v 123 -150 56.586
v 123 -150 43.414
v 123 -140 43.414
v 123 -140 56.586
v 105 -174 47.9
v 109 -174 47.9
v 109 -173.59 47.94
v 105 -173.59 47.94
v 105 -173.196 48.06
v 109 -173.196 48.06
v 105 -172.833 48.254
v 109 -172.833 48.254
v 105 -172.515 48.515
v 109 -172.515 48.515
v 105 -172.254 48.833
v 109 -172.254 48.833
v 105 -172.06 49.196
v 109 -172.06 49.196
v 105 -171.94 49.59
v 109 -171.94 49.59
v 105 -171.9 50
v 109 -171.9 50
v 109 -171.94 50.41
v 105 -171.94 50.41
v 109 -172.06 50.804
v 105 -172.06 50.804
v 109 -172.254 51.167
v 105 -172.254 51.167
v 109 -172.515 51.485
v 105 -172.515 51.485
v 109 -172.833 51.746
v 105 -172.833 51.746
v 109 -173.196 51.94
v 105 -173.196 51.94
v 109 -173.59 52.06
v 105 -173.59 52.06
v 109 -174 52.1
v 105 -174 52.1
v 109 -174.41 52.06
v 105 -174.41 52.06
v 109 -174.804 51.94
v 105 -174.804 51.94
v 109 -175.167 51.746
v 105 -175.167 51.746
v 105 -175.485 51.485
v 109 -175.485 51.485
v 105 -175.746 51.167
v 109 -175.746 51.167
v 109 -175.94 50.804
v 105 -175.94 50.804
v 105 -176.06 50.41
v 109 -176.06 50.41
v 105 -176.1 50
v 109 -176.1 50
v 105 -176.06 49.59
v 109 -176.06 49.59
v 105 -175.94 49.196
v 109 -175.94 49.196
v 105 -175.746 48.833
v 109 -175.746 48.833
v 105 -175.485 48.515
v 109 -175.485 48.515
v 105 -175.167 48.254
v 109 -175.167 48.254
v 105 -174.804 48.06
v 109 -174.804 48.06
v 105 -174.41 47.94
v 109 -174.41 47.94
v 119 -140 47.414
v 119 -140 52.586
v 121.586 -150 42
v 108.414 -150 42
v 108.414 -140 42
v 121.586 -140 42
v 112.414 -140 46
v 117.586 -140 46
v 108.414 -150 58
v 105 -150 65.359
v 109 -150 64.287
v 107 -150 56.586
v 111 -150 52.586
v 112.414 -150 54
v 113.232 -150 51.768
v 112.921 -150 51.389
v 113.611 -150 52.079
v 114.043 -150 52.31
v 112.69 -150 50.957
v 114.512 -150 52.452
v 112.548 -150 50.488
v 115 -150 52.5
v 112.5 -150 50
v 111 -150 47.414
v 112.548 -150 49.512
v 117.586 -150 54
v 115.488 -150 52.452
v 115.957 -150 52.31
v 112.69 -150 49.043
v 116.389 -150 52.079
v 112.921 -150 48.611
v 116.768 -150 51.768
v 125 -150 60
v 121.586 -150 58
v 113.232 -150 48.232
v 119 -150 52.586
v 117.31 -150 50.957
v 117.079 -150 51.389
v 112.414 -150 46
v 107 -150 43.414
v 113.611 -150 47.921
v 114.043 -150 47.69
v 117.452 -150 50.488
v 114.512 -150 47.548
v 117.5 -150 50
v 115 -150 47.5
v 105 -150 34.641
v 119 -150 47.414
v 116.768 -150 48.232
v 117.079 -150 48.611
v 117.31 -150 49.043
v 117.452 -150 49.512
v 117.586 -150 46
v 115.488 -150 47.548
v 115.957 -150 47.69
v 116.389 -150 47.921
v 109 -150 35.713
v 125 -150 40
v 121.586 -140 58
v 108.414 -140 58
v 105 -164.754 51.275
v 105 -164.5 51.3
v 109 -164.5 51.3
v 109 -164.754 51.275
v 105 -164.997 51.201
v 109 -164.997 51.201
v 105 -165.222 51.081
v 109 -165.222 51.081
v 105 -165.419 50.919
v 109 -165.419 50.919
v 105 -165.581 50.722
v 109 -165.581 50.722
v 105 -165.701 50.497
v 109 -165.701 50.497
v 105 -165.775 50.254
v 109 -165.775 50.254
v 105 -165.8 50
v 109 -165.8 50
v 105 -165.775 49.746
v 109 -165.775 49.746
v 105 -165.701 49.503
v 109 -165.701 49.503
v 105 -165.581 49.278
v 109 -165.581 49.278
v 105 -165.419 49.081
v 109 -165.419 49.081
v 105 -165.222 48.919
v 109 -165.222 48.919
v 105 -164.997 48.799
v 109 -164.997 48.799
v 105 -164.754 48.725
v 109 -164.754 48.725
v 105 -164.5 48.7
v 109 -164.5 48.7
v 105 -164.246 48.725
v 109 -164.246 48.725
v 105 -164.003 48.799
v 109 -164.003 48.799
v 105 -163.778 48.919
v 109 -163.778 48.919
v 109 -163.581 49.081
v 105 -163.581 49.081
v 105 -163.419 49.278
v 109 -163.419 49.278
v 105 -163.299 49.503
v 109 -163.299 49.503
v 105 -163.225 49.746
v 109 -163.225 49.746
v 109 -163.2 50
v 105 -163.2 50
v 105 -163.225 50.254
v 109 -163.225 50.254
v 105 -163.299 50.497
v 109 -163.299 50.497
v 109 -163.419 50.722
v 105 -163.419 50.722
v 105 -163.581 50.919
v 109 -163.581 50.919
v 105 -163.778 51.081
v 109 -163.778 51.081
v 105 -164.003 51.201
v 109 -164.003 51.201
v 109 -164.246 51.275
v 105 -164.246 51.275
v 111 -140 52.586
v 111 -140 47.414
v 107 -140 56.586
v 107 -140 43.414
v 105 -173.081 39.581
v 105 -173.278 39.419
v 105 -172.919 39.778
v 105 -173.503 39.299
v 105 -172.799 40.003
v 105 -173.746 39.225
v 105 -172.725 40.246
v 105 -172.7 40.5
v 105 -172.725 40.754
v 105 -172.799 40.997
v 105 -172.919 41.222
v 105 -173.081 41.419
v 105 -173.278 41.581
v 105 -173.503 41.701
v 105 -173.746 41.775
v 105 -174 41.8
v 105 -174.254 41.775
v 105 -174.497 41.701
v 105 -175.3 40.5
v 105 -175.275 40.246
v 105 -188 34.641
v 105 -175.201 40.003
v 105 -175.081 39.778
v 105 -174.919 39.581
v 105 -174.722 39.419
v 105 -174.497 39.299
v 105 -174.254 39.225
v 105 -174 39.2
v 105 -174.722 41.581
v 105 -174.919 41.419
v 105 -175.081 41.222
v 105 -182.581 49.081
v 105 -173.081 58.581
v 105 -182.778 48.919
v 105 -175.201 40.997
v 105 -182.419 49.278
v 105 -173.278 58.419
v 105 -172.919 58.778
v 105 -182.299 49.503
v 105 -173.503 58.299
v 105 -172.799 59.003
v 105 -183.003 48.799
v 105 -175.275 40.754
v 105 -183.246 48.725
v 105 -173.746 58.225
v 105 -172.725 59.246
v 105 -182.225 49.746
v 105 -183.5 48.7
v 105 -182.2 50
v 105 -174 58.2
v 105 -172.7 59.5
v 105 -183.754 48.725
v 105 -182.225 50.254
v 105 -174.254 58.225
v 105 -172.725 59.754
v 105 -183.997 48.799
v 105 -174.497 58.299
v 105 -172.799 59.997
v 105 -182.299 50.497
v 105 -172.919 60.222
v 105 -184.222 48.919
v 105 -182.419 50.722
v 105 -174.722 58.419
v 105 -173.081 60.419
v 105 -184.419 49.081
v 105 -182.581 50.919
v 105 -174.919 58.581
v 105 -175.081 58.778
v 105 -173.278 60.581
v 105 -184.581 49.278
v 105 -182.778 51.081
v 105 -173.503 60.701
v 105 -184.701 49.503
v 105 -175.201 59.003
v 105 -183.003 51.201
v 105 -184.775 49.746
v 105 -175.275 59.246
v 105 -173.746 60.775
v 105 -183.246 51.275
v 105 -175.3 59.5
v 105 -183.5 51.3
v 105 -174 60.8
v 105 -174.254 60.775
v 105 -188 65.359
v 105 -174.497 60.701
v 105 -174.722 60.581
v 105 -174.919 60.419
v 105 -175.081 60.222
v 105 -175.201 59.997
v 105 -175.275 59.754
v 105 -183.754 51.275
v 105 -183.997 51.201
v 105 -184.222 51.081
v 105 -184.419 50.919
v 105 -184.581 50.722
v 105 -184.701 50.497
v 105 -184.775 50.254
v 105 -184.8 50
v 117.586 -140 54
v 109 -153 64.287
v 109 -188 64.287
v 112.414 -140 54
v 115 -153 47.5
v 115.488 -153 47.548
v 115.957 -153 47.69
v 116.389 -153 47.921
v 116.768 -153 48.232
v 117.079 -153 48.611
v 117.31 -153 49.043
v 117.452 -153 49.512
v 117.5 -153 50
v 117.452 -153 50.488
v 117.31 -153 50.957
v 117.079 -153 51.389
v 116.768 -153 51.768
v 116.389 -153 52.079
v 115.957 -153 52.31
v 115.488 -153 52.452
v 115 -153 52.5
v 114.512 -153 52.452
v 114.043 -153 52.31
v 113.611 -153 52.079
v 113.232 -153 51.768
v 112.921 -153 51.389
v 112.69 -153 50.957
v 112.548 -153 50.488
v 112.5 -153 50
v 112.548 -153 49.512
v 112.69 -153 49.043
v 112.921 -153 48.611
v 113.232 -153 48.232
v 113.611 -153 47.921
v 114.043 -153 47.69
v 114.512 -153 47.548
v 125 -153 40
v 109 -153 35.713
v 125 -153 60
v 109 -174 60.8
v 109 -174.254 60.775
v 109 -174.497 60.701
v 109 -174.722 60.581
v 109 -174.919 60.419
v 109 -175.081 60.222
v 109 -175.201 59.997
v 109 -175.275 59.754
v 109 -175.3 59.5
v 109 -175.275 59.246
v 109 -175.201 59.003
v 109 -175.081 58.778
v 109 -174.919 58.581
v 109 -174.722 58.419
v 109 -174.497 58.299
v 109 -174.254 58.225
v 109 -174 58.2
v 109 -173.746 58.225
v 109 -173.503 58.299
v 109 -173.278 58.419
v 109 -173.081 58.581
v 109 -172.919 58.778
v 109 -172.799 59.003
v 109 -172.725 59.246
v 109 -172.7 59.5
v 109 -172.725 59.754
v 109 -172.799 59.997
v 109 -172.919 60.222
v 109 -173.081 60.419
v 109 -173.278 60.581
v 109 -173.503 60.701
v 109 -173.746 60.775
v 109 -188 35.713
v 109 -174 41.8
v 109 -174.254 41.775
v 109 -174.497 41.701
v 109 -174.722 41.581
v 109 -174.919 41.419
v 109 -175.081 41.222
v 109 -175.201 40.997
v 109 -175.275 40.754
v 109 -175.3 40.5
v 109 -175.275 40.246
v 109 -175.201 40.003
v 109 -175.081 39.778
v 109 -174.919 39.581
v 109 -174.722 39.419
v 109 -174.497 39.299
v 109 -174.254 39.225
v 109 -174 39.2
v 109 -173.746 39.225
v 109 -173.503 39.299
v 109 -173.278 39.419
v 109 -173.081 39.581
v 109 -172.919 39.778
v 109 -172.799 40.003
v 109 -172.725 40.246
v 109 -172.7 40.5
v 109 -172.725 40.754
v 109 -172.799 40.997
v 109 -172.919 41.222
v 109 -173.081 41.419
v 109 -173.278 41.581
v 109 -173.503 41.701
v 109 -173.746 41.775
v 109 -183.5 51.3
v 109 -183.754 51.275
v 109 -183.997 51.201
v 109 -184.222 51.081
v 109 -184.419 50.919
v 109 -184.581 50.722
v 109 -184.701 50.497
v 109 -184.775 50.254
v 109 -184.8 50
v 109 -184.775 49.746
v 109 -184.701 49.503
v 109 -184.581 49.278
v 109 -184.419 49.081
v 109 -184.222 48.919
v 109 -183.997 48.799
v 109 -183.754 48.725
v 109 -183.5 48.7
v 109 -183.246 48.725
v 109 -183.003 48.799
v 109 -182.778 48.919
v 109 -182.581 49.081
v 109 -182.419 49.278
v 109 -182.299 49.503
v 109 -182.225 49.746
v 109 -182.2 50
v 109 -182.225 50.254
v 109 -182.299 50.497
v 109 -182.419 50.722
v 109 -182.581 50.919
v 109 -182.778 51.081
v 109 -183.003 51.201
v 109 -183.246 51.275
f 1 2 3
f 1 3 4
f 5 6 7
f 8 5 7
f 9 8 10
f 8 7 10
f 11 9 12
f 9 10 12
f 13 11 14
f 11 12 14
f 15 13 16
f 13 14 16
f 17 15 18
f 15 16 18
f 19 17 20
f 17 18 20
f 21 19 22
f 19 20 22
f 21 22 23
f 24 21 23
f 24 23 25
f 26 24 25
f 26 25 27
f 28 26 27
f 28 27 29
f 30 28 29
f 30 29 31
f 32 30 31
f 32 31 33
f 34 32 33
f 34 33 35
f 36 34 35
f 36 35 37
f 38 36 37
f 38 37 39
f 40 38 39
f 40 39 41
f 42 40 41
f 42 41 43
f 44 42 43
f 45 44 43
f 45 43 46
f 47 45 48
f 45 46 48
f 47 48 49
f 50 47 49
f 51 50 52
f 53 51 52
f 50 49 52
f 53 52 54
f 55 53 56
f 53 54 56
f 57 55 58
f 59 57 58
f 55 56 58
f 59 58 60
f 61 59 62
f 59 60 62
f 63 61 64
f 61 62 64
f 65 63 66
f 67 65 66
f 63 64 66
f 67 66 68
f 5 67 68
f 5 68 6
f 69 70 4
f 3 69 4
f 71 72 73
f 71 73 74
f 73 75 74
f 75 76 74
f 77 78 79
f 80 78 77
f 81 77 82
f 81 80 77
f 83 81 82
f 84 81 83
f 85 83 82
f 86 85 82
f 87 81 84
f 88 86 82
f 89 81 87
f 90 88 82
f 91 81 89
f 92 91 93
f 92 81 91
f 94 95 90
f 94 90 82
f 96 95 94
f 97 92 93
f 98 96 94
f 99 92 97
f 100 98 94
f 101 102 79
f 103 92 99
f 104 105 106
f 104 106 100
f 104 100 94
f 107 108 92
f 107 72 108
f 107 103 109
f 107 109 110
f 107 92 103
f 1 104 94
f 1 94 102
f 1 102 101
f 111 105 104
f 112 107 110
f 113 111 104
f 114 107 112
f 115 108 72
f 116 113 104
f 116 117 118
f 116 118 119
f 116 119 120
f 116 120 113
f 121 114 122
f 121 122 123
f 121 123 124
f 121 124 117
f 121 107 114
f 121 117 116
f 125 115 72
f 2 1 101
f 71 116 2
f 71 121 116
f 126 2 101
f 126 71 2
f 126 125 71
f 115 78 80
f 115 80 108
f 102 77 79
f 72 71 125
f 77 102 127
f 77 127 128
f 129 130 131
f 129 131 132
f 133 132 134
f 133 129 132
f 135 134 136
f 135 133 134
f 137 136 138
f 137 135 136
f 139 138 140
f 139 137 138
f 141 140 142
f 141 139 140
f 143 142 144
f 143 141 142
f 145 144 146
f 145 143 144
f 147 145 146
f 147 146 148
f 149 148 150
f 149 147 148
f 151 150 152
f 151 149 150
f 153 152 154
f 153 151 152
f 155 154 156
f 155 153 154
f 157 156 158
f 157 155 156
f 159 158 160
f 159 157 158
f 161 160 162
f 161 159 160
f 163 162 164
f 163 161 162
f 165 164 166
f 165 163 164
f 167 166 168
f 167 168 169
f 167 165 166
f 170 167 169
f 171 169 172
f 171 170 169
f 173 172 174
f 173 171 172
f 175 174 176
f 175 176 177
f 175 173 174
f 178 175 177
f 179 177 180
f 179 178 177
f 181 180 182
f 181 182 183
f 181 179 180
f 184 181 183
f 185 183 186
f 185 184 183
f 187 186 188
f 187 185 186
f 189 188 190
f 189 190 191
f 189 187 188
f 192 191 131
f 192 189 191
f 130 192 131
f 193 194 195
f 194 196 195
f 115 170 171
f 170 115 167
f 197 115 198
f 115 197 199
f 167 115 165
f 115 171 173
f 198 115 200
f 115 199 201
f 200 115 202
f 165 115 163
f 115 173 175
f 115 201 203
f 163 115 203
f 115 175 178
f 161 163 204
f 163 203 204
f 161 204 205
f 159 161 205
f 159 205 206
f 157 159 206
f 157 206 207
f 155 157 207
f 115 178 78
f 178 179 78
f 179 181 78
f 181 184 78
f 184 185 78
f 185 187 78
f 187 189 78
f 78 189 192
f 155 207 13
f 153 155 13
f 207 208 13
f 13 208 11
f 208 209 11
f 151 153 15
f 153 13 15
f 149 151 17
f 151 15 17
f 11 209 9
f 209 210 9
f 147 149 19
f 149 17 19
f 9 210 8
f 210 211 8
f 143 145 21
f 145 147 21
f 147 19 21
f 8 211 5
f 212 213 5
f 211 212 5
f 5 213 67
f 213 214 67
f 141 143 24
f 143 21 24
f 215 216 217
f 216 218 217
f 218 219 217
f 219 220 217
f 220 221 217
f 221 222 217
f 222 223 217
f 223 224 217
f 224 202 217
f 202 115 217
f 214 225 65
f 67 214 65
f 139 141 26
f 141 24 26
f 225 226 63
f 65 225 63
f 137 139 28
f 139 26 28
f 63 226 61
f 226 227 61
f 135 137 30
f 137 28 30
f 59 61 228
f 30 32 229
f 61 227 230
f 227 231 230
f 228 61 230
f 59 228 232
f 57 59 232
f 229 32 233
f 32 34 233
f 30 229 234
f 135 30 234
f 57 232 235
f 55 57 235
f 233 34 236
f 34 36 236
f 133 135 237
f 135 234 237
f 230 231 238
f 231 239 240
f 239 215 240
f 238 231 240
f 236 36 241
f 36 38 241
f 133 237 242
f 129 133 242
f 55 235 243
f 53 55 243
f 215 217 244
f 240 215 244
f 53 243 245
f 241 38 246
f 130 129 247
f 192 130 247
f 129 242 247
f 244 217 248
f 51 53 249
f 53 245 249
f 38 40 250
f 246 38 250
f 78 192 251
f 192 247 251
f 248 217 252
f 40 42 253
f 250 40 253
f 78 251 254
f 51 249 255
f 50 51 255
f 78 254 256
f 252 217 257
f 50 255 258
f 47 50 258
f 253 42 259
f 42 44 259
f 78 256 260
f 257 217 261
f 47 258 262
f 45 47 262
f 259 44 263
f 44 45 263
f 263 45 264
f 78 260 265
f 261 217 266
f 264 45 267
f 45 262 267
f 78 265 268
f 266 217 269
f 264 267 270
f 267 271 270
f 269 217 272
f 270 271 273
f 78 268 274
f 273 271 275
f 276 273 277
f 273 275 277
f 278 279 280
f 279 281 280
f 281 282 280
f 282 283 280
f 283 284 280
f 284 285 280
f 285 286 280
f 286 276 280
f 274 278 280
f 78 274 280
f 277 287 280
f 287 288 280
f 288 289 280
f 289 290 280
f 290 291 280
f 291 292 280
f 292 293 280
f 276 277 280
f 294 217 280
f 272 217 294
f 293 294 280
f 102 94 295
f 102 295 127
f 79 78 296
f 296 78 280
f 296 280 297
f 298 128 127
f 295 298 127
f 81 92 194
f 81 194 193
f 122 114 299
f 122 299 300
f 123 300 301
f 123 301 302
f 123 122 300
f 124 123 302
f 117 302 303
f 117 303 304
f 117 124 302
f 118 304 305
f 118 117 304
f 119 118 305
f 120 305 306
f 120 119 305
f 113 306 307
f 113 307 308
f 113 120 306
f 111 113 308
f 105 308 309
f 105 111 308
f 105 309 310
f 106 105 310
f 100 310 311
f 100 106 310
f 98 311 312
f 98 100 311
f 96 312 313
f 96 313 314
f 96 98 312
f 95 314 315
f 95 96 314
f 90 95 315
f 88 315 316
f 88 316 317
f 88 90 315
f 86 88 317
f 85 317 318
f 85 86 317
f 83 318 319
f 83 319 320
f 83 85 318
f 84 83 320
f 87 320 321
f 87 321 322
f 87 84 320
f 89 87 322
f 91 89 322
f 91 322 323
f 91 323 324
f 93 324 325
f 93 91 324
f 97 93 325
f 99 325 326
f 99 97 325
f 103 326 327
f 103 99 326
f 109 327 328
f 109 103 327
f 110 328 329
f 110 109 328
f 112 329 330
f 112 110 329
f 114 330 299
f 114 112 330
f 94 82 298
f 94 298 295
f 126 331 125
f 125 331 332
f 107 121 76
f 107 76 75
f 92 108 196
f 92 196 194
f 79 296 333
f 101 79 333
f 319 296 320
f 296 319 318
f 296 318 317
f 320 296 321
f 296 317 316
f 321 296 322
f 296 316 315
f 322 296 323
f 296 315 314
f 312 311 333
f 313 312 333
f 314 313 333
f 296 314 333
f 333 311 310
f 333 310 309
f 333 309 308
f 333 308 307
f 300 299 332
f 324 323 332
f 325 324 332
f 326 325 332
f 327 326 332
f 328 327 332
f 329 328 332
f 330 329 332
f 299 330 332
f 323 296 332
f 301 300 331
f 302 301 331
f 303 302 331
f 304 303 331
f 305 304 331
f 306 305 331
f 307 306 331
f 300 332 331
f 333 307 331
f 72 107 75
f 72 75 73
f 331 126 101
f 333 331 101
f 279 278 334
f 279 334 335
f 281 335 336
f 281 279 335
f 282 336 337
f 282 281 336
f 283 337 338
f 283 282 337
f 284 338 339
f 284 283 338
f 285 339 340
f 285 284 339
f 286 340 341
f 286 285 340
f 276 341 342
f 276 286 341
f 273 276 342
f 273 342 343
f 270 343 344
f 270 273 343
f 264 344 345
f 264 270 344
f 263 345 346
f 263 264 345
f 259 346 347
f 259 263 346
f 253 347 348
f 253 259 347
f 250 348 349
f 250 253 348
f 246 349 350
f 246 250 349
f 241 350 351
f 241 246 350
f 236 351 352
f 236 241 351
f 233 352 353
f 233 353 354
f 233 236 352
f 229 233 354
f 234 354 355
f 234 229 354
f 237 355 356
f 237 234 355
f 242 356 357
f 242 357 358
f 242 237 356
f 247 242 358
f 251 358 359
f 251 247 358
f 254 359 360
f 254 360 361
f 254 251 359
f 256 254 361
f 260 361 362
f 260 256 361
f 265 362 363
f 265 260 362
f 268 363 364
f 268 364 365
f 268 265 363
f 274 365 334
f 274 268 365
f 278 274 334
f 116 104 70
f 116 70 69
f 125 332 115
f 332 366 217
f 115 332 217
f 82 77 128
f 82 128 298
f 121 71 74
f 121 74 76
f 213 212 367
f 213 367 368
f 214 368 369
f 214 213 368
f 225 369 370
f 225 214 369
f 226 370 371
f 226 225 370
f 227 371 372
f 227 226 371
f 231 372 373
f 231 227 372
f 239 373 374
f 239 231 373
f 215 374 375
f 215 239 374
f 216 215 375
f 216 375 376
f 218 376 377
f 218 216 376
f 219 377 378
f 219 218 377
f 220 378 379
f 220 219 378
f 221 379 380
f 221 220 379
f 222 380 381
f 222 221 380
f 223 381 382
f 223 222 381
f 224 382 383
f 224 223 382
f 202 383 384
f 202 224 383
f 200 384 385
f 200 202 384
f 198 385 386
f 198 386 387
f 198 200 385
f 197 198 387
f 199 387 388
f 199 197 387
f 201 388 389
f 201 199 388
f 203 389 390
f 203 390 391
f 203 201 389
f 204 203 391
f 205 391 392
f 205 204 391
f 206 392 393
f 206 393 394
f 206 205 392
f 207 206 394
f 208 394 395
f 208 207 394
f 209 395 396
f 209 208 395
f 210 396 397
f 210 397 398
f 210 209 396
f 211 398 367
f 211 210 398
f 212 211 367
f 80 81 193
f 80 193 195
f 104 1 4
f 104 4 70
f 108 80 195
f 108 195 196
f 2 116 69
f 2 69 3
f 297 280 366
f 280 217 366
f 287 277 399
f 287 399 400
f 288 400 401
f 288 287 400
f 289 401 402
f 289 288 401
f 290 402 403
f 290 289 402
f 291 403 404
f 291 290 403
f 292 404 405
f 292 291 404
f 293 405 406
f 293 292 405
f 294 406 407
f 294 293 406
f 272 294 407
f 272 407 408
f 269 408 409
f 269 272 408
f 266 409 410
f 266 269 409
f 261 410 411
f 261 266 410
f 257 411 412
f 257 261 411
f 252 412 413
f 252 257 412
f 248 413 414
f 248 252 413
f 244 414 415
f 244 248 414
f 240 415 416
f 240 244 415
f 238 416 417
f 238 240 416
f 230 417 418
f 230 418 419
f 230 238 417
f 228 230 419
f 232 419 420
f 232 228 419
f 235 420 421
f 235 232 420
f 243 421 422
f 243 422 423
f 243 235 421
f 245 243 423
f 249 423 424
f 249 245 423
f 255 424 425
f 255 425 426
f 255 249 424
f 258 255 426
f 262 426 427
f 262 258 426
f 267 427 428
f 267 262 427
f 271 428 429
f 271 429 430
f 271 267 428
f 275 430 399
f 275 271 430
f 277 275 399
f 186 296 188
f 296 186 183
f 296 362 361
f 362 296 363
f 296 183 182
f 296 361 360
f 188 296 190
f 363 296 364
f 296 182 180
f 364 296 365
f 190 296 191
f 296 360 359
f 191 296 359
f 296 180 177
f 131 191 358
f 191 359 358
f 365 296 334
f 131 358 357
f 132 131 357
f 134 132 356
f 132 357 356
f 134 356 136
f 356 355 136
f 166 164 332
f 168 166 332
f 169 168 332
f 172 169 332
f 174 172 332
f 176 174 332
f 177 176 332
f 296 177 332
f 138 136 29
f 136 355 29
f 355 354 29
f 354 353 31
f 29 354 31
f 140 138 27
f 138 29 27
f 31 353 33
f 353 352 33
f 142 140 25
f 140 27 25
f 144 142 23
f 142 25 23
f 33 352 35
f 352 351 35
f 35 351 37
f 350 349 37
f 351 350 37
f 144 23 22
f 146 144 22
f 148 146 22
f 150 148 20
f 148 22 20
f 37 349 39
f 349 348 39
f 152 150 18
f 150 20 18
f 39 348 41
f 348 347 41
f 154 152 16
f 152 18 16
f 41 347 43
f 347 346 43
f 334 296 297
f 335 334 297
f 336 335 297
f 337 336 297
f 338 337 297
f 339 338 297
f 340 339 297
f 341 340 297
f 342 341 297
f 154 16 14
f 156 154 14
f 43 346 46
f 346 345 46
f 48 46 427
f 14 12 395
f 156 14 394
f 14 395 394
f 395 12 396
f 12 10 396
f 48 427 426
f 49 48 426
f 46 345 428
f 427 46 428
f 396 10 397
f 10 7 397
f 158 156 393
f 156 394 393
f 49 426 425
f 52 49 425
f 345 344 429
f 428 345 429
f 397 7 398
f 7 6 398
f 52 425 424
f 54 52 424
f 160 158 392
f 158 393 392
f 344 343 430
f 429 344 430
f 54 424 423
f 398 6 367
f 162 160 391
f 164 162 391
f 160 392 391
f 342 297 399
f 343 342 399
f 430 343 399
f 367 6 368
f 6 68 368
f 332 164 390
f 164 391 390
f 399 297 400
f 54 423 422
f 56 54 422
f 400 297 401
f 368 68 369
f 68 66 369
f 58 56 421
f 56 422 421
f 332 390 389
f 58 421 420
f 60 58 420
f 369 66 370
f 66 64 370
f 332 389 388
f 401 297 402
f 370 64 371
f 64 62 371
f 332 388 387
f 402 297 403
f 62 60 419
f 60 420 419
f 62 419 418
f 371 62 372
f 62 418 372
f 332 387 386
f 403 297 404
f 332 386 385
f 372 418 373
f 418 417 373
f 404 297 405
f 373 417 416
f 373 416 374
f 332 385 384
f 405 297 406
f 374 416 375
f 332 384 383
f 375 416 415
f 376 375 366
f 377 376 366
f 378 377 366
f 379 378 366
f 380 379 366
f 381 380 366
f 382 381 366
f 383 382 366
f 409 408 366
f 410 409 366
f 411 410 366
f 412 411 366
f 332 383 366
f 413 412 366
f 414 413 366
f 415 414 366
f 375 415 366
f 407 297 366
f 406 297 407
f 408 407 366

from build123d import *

# Parameters (mm, degrees)
BOSS_EXTRUDE1_DEPTH   = 10
BOSS_EXTRUDE1_2_DEPTH = 10
BOSS_EXTRUDE1_3_DEPTH = 10
BOSS_EXTRUDE1_4_DEPTH = 10
SKETCH1_3_W           = 20
SKETCH1_3_H           = 20
SKETCH1_3_R           = 2.5
BOSS_EXTRUDE2_DEPTH   = 3
SKETCH3_W             = 4
SKETCH3_H             = 20
BOSS_EXTRUDE3_DEPTH   = 35
BOSS_EXTRUDE4_START   = -188
BOSS_EXTRUDE4_DEPTH   = 38
BOSS_EXTRUDE4_START_2 = -153
BOSS_EXTRUDE4_2_DEPTH = 3
BOSS_EXTRUDE8_START   = -188
BOSS_EXTRUDE8_DEPTH   = 38
BOSS_EXTRUDE8_START_2 = -153
BOSS_EXTRUDE8_2_DEPTH = 3
SKETCH4_R             = 1.3
CUT_EXTRUDE1_DEPTH    = 4
SKETCH5_R             = 2.1
CUT_EXTRUDE2_DEPTH    = 200.679234698


# Read off the part's stored shape, not the designer's step: Boss-Extrude4, Boss-Extrude8
with BuildPart() as part:
    # Sketch1 → Boss-Extrude1 (new body)
    with BuildSketch(Plane.XZ.offset(150)):
        Polygon((111.9, 58), (108.414213562, 58), (112.414213562, 54), (117.585786438, 54), (121.585786438, 58), (118.1, 58), align=None)
    extrude(amount=-BOSS_EXTRUDE1_DEPTH)



with BuildPart() as body_2:
    # Sketch1 → Boss-Extrude1 2 (new body)
    with BuildSketch(Plane.XZ.offset(150)):
        Polygon((111, 47.414213562), (111, 52.585786438), (107, 56.585786438), (107, 53.1), (107, 46.9), (107, 43.414213562), align=None)
    extrude(amount=-BOSS_EXTRUDE1_2_DEPTH)


with BuildPart() as body_3:
    # Sketch1 → Boss-Extrude1 3 (new body)
    with BuildSketch(Plane.XZ.offset(150)):
        Polygon((123, 53.1), (123, 56.585786438), (119, 52.585786438), (119, 47.414213562), (123, 43.414213562), (123, 46.9), align=None)
    extrude(amount=-BOSS_EXTRUDE1_3_DEPTH)


with BuildPart() as body_4:
    # Sketch1 → Boss-Extrude1 4 (new body)
    with BuildSketch(Plane.XZ.offset(150)):
        Polygon((112.414213562, 46), (108.414213562, 42), (111.9, 42), (118.1, 42), (121.585786438, 42), (117.585786438, 46), align=None)
    extrude(amount=-BOSS_EXTRUDE1_4_DEPTH)


with BuildPart() as part_1:
    add(part.part)

    add(body_2.part)  # Boss-Extrude2 merges body 2

    add(body_3.part)  # Boss-Extrude2 merges body 3

    add(body_4.part)  # Boss-Extrude2 merges body 4
    # Sketch1<3> → Boss-Extrude2 (add)
    with BuildSketch(Plane.XZ.offset(150)):
        with Locations((115, 50)):
            Rectangle(SKETCH1_3_W, SKETCH1_3_H)
        with Locations(Location((115, 50, 0), (0, 0, 270))):
            Circle(SKETCH1_3_R, mode=Mode.SUBTRACT)
    extrude(amount=BOSS_EXTRUDE2_DEPTH)

    # Sketch3 → Boss-Extrude3 (add)
    with BuildSketch(Plane.XZ.offset(153)):
        with Locations((107, 50)):
            Rectangle(SKETCH3_W, SKETCH3_H)
    extrude(amount=BOSS_EXTRUDE3_DEPTH)

    # Boss-Extrude4 outline → Boss-Extrude4 (add)
    with BuildSketch(Plane(origin=(0, 0, 0), x_dir=(1, 0, 0), z_dir=(0, 1, 0)).offset(BOSS_EXTRUDE4_START)):
        Polygon((105, -34.641016151), (105, -40), (109, -40), (109, -35.712812921), align=None)
    extrude(amount=BOSS_EXTRUDE4_DEPTH)

    # Boss-Extrude4 2 outline → Boss-Extrude4 2 (add)
    with BuildSketch(Plane(origin=(0, 0, 0), x_dir=(1, 0, 0), z_dir=(0, 1, 0)).offset(BOSS_EXTRUDE4_START_2)):
        Polygon((109, -35.712812921), (109, -40), (125, -40), align=None)
    extrude(amount=BOSS_EXTRUDE4_2_DEPTH)

    # Boss-Extrude8 outline → Boss-Extrude8 (add)
    with BuildSketch(Plane(origin=(0, 0, 0), x_dir=(1, 0, 0), z_dir=(0, 1, 0)).offset(BOSS_EXTRUDE8_START)):
        Polygon((105, -60), (105, -65.358983849), (109, -64.287187079), (109, -60), align=None)
    extrude(amount=BOSS_EXTRUDE8_DEPTH)

    # Boss-Extrude8 2 outline → Boss-Extrude8 2 (add)
    with BuildSketch(Plane(origin=(0, 0, 0), x_dir=(1, 0, 0), z_dir=(0, 1, 0)).offset(BOSS_EXTRUDE8_START_2)):
        Polygon((109, -60), (109, -64.287187079), (125, -60), align=None)
    extrude(amount=BOSS_EXTRUDE8_2_DEPTH)

    # Sketch4 → Cut-Extrude1 (cut)
    with BuildSketch(Plane(origin=(105, 0, -65), x_dir=(0, 0, -1), z_dir=(1, 0, 0))):
        with Locations(Location((-115, -164.5, 0), (0, 0, 180))):
            Circle(SKETCH4_R)
        with Locations(Location((-105.5, -174, 0), (0, 0, 180))):
            Circle(SKETCH4_R)
        with Locations(Location((-115, -183.5, 0), (0, 0, 180))):
            Circle(SKETCH4_R)
        with Locations(Location((-124.5, -174, 0), (0, 0, 180))):
            Circle(SKETCH4_R)
    extrude(amount=CUT_EXTRUDE1_DEPTH, mode=Mode.SUBTRACT)

    # Sketch5 → Cut-Extrude2 (cut, through all)
    with BuildSketch(Plane(origin=(109, 0, 0), x_dir=(0, 0, -1), z_dir=(1, 0, 0))):
        with Locations((-50, -174)):
            Circle(SKETCH5_R)
    extrude(amount=-CUT_EXTRUDE2_DEPTH, mode=Mode.SUBTRACT)


solid = part_1.part
